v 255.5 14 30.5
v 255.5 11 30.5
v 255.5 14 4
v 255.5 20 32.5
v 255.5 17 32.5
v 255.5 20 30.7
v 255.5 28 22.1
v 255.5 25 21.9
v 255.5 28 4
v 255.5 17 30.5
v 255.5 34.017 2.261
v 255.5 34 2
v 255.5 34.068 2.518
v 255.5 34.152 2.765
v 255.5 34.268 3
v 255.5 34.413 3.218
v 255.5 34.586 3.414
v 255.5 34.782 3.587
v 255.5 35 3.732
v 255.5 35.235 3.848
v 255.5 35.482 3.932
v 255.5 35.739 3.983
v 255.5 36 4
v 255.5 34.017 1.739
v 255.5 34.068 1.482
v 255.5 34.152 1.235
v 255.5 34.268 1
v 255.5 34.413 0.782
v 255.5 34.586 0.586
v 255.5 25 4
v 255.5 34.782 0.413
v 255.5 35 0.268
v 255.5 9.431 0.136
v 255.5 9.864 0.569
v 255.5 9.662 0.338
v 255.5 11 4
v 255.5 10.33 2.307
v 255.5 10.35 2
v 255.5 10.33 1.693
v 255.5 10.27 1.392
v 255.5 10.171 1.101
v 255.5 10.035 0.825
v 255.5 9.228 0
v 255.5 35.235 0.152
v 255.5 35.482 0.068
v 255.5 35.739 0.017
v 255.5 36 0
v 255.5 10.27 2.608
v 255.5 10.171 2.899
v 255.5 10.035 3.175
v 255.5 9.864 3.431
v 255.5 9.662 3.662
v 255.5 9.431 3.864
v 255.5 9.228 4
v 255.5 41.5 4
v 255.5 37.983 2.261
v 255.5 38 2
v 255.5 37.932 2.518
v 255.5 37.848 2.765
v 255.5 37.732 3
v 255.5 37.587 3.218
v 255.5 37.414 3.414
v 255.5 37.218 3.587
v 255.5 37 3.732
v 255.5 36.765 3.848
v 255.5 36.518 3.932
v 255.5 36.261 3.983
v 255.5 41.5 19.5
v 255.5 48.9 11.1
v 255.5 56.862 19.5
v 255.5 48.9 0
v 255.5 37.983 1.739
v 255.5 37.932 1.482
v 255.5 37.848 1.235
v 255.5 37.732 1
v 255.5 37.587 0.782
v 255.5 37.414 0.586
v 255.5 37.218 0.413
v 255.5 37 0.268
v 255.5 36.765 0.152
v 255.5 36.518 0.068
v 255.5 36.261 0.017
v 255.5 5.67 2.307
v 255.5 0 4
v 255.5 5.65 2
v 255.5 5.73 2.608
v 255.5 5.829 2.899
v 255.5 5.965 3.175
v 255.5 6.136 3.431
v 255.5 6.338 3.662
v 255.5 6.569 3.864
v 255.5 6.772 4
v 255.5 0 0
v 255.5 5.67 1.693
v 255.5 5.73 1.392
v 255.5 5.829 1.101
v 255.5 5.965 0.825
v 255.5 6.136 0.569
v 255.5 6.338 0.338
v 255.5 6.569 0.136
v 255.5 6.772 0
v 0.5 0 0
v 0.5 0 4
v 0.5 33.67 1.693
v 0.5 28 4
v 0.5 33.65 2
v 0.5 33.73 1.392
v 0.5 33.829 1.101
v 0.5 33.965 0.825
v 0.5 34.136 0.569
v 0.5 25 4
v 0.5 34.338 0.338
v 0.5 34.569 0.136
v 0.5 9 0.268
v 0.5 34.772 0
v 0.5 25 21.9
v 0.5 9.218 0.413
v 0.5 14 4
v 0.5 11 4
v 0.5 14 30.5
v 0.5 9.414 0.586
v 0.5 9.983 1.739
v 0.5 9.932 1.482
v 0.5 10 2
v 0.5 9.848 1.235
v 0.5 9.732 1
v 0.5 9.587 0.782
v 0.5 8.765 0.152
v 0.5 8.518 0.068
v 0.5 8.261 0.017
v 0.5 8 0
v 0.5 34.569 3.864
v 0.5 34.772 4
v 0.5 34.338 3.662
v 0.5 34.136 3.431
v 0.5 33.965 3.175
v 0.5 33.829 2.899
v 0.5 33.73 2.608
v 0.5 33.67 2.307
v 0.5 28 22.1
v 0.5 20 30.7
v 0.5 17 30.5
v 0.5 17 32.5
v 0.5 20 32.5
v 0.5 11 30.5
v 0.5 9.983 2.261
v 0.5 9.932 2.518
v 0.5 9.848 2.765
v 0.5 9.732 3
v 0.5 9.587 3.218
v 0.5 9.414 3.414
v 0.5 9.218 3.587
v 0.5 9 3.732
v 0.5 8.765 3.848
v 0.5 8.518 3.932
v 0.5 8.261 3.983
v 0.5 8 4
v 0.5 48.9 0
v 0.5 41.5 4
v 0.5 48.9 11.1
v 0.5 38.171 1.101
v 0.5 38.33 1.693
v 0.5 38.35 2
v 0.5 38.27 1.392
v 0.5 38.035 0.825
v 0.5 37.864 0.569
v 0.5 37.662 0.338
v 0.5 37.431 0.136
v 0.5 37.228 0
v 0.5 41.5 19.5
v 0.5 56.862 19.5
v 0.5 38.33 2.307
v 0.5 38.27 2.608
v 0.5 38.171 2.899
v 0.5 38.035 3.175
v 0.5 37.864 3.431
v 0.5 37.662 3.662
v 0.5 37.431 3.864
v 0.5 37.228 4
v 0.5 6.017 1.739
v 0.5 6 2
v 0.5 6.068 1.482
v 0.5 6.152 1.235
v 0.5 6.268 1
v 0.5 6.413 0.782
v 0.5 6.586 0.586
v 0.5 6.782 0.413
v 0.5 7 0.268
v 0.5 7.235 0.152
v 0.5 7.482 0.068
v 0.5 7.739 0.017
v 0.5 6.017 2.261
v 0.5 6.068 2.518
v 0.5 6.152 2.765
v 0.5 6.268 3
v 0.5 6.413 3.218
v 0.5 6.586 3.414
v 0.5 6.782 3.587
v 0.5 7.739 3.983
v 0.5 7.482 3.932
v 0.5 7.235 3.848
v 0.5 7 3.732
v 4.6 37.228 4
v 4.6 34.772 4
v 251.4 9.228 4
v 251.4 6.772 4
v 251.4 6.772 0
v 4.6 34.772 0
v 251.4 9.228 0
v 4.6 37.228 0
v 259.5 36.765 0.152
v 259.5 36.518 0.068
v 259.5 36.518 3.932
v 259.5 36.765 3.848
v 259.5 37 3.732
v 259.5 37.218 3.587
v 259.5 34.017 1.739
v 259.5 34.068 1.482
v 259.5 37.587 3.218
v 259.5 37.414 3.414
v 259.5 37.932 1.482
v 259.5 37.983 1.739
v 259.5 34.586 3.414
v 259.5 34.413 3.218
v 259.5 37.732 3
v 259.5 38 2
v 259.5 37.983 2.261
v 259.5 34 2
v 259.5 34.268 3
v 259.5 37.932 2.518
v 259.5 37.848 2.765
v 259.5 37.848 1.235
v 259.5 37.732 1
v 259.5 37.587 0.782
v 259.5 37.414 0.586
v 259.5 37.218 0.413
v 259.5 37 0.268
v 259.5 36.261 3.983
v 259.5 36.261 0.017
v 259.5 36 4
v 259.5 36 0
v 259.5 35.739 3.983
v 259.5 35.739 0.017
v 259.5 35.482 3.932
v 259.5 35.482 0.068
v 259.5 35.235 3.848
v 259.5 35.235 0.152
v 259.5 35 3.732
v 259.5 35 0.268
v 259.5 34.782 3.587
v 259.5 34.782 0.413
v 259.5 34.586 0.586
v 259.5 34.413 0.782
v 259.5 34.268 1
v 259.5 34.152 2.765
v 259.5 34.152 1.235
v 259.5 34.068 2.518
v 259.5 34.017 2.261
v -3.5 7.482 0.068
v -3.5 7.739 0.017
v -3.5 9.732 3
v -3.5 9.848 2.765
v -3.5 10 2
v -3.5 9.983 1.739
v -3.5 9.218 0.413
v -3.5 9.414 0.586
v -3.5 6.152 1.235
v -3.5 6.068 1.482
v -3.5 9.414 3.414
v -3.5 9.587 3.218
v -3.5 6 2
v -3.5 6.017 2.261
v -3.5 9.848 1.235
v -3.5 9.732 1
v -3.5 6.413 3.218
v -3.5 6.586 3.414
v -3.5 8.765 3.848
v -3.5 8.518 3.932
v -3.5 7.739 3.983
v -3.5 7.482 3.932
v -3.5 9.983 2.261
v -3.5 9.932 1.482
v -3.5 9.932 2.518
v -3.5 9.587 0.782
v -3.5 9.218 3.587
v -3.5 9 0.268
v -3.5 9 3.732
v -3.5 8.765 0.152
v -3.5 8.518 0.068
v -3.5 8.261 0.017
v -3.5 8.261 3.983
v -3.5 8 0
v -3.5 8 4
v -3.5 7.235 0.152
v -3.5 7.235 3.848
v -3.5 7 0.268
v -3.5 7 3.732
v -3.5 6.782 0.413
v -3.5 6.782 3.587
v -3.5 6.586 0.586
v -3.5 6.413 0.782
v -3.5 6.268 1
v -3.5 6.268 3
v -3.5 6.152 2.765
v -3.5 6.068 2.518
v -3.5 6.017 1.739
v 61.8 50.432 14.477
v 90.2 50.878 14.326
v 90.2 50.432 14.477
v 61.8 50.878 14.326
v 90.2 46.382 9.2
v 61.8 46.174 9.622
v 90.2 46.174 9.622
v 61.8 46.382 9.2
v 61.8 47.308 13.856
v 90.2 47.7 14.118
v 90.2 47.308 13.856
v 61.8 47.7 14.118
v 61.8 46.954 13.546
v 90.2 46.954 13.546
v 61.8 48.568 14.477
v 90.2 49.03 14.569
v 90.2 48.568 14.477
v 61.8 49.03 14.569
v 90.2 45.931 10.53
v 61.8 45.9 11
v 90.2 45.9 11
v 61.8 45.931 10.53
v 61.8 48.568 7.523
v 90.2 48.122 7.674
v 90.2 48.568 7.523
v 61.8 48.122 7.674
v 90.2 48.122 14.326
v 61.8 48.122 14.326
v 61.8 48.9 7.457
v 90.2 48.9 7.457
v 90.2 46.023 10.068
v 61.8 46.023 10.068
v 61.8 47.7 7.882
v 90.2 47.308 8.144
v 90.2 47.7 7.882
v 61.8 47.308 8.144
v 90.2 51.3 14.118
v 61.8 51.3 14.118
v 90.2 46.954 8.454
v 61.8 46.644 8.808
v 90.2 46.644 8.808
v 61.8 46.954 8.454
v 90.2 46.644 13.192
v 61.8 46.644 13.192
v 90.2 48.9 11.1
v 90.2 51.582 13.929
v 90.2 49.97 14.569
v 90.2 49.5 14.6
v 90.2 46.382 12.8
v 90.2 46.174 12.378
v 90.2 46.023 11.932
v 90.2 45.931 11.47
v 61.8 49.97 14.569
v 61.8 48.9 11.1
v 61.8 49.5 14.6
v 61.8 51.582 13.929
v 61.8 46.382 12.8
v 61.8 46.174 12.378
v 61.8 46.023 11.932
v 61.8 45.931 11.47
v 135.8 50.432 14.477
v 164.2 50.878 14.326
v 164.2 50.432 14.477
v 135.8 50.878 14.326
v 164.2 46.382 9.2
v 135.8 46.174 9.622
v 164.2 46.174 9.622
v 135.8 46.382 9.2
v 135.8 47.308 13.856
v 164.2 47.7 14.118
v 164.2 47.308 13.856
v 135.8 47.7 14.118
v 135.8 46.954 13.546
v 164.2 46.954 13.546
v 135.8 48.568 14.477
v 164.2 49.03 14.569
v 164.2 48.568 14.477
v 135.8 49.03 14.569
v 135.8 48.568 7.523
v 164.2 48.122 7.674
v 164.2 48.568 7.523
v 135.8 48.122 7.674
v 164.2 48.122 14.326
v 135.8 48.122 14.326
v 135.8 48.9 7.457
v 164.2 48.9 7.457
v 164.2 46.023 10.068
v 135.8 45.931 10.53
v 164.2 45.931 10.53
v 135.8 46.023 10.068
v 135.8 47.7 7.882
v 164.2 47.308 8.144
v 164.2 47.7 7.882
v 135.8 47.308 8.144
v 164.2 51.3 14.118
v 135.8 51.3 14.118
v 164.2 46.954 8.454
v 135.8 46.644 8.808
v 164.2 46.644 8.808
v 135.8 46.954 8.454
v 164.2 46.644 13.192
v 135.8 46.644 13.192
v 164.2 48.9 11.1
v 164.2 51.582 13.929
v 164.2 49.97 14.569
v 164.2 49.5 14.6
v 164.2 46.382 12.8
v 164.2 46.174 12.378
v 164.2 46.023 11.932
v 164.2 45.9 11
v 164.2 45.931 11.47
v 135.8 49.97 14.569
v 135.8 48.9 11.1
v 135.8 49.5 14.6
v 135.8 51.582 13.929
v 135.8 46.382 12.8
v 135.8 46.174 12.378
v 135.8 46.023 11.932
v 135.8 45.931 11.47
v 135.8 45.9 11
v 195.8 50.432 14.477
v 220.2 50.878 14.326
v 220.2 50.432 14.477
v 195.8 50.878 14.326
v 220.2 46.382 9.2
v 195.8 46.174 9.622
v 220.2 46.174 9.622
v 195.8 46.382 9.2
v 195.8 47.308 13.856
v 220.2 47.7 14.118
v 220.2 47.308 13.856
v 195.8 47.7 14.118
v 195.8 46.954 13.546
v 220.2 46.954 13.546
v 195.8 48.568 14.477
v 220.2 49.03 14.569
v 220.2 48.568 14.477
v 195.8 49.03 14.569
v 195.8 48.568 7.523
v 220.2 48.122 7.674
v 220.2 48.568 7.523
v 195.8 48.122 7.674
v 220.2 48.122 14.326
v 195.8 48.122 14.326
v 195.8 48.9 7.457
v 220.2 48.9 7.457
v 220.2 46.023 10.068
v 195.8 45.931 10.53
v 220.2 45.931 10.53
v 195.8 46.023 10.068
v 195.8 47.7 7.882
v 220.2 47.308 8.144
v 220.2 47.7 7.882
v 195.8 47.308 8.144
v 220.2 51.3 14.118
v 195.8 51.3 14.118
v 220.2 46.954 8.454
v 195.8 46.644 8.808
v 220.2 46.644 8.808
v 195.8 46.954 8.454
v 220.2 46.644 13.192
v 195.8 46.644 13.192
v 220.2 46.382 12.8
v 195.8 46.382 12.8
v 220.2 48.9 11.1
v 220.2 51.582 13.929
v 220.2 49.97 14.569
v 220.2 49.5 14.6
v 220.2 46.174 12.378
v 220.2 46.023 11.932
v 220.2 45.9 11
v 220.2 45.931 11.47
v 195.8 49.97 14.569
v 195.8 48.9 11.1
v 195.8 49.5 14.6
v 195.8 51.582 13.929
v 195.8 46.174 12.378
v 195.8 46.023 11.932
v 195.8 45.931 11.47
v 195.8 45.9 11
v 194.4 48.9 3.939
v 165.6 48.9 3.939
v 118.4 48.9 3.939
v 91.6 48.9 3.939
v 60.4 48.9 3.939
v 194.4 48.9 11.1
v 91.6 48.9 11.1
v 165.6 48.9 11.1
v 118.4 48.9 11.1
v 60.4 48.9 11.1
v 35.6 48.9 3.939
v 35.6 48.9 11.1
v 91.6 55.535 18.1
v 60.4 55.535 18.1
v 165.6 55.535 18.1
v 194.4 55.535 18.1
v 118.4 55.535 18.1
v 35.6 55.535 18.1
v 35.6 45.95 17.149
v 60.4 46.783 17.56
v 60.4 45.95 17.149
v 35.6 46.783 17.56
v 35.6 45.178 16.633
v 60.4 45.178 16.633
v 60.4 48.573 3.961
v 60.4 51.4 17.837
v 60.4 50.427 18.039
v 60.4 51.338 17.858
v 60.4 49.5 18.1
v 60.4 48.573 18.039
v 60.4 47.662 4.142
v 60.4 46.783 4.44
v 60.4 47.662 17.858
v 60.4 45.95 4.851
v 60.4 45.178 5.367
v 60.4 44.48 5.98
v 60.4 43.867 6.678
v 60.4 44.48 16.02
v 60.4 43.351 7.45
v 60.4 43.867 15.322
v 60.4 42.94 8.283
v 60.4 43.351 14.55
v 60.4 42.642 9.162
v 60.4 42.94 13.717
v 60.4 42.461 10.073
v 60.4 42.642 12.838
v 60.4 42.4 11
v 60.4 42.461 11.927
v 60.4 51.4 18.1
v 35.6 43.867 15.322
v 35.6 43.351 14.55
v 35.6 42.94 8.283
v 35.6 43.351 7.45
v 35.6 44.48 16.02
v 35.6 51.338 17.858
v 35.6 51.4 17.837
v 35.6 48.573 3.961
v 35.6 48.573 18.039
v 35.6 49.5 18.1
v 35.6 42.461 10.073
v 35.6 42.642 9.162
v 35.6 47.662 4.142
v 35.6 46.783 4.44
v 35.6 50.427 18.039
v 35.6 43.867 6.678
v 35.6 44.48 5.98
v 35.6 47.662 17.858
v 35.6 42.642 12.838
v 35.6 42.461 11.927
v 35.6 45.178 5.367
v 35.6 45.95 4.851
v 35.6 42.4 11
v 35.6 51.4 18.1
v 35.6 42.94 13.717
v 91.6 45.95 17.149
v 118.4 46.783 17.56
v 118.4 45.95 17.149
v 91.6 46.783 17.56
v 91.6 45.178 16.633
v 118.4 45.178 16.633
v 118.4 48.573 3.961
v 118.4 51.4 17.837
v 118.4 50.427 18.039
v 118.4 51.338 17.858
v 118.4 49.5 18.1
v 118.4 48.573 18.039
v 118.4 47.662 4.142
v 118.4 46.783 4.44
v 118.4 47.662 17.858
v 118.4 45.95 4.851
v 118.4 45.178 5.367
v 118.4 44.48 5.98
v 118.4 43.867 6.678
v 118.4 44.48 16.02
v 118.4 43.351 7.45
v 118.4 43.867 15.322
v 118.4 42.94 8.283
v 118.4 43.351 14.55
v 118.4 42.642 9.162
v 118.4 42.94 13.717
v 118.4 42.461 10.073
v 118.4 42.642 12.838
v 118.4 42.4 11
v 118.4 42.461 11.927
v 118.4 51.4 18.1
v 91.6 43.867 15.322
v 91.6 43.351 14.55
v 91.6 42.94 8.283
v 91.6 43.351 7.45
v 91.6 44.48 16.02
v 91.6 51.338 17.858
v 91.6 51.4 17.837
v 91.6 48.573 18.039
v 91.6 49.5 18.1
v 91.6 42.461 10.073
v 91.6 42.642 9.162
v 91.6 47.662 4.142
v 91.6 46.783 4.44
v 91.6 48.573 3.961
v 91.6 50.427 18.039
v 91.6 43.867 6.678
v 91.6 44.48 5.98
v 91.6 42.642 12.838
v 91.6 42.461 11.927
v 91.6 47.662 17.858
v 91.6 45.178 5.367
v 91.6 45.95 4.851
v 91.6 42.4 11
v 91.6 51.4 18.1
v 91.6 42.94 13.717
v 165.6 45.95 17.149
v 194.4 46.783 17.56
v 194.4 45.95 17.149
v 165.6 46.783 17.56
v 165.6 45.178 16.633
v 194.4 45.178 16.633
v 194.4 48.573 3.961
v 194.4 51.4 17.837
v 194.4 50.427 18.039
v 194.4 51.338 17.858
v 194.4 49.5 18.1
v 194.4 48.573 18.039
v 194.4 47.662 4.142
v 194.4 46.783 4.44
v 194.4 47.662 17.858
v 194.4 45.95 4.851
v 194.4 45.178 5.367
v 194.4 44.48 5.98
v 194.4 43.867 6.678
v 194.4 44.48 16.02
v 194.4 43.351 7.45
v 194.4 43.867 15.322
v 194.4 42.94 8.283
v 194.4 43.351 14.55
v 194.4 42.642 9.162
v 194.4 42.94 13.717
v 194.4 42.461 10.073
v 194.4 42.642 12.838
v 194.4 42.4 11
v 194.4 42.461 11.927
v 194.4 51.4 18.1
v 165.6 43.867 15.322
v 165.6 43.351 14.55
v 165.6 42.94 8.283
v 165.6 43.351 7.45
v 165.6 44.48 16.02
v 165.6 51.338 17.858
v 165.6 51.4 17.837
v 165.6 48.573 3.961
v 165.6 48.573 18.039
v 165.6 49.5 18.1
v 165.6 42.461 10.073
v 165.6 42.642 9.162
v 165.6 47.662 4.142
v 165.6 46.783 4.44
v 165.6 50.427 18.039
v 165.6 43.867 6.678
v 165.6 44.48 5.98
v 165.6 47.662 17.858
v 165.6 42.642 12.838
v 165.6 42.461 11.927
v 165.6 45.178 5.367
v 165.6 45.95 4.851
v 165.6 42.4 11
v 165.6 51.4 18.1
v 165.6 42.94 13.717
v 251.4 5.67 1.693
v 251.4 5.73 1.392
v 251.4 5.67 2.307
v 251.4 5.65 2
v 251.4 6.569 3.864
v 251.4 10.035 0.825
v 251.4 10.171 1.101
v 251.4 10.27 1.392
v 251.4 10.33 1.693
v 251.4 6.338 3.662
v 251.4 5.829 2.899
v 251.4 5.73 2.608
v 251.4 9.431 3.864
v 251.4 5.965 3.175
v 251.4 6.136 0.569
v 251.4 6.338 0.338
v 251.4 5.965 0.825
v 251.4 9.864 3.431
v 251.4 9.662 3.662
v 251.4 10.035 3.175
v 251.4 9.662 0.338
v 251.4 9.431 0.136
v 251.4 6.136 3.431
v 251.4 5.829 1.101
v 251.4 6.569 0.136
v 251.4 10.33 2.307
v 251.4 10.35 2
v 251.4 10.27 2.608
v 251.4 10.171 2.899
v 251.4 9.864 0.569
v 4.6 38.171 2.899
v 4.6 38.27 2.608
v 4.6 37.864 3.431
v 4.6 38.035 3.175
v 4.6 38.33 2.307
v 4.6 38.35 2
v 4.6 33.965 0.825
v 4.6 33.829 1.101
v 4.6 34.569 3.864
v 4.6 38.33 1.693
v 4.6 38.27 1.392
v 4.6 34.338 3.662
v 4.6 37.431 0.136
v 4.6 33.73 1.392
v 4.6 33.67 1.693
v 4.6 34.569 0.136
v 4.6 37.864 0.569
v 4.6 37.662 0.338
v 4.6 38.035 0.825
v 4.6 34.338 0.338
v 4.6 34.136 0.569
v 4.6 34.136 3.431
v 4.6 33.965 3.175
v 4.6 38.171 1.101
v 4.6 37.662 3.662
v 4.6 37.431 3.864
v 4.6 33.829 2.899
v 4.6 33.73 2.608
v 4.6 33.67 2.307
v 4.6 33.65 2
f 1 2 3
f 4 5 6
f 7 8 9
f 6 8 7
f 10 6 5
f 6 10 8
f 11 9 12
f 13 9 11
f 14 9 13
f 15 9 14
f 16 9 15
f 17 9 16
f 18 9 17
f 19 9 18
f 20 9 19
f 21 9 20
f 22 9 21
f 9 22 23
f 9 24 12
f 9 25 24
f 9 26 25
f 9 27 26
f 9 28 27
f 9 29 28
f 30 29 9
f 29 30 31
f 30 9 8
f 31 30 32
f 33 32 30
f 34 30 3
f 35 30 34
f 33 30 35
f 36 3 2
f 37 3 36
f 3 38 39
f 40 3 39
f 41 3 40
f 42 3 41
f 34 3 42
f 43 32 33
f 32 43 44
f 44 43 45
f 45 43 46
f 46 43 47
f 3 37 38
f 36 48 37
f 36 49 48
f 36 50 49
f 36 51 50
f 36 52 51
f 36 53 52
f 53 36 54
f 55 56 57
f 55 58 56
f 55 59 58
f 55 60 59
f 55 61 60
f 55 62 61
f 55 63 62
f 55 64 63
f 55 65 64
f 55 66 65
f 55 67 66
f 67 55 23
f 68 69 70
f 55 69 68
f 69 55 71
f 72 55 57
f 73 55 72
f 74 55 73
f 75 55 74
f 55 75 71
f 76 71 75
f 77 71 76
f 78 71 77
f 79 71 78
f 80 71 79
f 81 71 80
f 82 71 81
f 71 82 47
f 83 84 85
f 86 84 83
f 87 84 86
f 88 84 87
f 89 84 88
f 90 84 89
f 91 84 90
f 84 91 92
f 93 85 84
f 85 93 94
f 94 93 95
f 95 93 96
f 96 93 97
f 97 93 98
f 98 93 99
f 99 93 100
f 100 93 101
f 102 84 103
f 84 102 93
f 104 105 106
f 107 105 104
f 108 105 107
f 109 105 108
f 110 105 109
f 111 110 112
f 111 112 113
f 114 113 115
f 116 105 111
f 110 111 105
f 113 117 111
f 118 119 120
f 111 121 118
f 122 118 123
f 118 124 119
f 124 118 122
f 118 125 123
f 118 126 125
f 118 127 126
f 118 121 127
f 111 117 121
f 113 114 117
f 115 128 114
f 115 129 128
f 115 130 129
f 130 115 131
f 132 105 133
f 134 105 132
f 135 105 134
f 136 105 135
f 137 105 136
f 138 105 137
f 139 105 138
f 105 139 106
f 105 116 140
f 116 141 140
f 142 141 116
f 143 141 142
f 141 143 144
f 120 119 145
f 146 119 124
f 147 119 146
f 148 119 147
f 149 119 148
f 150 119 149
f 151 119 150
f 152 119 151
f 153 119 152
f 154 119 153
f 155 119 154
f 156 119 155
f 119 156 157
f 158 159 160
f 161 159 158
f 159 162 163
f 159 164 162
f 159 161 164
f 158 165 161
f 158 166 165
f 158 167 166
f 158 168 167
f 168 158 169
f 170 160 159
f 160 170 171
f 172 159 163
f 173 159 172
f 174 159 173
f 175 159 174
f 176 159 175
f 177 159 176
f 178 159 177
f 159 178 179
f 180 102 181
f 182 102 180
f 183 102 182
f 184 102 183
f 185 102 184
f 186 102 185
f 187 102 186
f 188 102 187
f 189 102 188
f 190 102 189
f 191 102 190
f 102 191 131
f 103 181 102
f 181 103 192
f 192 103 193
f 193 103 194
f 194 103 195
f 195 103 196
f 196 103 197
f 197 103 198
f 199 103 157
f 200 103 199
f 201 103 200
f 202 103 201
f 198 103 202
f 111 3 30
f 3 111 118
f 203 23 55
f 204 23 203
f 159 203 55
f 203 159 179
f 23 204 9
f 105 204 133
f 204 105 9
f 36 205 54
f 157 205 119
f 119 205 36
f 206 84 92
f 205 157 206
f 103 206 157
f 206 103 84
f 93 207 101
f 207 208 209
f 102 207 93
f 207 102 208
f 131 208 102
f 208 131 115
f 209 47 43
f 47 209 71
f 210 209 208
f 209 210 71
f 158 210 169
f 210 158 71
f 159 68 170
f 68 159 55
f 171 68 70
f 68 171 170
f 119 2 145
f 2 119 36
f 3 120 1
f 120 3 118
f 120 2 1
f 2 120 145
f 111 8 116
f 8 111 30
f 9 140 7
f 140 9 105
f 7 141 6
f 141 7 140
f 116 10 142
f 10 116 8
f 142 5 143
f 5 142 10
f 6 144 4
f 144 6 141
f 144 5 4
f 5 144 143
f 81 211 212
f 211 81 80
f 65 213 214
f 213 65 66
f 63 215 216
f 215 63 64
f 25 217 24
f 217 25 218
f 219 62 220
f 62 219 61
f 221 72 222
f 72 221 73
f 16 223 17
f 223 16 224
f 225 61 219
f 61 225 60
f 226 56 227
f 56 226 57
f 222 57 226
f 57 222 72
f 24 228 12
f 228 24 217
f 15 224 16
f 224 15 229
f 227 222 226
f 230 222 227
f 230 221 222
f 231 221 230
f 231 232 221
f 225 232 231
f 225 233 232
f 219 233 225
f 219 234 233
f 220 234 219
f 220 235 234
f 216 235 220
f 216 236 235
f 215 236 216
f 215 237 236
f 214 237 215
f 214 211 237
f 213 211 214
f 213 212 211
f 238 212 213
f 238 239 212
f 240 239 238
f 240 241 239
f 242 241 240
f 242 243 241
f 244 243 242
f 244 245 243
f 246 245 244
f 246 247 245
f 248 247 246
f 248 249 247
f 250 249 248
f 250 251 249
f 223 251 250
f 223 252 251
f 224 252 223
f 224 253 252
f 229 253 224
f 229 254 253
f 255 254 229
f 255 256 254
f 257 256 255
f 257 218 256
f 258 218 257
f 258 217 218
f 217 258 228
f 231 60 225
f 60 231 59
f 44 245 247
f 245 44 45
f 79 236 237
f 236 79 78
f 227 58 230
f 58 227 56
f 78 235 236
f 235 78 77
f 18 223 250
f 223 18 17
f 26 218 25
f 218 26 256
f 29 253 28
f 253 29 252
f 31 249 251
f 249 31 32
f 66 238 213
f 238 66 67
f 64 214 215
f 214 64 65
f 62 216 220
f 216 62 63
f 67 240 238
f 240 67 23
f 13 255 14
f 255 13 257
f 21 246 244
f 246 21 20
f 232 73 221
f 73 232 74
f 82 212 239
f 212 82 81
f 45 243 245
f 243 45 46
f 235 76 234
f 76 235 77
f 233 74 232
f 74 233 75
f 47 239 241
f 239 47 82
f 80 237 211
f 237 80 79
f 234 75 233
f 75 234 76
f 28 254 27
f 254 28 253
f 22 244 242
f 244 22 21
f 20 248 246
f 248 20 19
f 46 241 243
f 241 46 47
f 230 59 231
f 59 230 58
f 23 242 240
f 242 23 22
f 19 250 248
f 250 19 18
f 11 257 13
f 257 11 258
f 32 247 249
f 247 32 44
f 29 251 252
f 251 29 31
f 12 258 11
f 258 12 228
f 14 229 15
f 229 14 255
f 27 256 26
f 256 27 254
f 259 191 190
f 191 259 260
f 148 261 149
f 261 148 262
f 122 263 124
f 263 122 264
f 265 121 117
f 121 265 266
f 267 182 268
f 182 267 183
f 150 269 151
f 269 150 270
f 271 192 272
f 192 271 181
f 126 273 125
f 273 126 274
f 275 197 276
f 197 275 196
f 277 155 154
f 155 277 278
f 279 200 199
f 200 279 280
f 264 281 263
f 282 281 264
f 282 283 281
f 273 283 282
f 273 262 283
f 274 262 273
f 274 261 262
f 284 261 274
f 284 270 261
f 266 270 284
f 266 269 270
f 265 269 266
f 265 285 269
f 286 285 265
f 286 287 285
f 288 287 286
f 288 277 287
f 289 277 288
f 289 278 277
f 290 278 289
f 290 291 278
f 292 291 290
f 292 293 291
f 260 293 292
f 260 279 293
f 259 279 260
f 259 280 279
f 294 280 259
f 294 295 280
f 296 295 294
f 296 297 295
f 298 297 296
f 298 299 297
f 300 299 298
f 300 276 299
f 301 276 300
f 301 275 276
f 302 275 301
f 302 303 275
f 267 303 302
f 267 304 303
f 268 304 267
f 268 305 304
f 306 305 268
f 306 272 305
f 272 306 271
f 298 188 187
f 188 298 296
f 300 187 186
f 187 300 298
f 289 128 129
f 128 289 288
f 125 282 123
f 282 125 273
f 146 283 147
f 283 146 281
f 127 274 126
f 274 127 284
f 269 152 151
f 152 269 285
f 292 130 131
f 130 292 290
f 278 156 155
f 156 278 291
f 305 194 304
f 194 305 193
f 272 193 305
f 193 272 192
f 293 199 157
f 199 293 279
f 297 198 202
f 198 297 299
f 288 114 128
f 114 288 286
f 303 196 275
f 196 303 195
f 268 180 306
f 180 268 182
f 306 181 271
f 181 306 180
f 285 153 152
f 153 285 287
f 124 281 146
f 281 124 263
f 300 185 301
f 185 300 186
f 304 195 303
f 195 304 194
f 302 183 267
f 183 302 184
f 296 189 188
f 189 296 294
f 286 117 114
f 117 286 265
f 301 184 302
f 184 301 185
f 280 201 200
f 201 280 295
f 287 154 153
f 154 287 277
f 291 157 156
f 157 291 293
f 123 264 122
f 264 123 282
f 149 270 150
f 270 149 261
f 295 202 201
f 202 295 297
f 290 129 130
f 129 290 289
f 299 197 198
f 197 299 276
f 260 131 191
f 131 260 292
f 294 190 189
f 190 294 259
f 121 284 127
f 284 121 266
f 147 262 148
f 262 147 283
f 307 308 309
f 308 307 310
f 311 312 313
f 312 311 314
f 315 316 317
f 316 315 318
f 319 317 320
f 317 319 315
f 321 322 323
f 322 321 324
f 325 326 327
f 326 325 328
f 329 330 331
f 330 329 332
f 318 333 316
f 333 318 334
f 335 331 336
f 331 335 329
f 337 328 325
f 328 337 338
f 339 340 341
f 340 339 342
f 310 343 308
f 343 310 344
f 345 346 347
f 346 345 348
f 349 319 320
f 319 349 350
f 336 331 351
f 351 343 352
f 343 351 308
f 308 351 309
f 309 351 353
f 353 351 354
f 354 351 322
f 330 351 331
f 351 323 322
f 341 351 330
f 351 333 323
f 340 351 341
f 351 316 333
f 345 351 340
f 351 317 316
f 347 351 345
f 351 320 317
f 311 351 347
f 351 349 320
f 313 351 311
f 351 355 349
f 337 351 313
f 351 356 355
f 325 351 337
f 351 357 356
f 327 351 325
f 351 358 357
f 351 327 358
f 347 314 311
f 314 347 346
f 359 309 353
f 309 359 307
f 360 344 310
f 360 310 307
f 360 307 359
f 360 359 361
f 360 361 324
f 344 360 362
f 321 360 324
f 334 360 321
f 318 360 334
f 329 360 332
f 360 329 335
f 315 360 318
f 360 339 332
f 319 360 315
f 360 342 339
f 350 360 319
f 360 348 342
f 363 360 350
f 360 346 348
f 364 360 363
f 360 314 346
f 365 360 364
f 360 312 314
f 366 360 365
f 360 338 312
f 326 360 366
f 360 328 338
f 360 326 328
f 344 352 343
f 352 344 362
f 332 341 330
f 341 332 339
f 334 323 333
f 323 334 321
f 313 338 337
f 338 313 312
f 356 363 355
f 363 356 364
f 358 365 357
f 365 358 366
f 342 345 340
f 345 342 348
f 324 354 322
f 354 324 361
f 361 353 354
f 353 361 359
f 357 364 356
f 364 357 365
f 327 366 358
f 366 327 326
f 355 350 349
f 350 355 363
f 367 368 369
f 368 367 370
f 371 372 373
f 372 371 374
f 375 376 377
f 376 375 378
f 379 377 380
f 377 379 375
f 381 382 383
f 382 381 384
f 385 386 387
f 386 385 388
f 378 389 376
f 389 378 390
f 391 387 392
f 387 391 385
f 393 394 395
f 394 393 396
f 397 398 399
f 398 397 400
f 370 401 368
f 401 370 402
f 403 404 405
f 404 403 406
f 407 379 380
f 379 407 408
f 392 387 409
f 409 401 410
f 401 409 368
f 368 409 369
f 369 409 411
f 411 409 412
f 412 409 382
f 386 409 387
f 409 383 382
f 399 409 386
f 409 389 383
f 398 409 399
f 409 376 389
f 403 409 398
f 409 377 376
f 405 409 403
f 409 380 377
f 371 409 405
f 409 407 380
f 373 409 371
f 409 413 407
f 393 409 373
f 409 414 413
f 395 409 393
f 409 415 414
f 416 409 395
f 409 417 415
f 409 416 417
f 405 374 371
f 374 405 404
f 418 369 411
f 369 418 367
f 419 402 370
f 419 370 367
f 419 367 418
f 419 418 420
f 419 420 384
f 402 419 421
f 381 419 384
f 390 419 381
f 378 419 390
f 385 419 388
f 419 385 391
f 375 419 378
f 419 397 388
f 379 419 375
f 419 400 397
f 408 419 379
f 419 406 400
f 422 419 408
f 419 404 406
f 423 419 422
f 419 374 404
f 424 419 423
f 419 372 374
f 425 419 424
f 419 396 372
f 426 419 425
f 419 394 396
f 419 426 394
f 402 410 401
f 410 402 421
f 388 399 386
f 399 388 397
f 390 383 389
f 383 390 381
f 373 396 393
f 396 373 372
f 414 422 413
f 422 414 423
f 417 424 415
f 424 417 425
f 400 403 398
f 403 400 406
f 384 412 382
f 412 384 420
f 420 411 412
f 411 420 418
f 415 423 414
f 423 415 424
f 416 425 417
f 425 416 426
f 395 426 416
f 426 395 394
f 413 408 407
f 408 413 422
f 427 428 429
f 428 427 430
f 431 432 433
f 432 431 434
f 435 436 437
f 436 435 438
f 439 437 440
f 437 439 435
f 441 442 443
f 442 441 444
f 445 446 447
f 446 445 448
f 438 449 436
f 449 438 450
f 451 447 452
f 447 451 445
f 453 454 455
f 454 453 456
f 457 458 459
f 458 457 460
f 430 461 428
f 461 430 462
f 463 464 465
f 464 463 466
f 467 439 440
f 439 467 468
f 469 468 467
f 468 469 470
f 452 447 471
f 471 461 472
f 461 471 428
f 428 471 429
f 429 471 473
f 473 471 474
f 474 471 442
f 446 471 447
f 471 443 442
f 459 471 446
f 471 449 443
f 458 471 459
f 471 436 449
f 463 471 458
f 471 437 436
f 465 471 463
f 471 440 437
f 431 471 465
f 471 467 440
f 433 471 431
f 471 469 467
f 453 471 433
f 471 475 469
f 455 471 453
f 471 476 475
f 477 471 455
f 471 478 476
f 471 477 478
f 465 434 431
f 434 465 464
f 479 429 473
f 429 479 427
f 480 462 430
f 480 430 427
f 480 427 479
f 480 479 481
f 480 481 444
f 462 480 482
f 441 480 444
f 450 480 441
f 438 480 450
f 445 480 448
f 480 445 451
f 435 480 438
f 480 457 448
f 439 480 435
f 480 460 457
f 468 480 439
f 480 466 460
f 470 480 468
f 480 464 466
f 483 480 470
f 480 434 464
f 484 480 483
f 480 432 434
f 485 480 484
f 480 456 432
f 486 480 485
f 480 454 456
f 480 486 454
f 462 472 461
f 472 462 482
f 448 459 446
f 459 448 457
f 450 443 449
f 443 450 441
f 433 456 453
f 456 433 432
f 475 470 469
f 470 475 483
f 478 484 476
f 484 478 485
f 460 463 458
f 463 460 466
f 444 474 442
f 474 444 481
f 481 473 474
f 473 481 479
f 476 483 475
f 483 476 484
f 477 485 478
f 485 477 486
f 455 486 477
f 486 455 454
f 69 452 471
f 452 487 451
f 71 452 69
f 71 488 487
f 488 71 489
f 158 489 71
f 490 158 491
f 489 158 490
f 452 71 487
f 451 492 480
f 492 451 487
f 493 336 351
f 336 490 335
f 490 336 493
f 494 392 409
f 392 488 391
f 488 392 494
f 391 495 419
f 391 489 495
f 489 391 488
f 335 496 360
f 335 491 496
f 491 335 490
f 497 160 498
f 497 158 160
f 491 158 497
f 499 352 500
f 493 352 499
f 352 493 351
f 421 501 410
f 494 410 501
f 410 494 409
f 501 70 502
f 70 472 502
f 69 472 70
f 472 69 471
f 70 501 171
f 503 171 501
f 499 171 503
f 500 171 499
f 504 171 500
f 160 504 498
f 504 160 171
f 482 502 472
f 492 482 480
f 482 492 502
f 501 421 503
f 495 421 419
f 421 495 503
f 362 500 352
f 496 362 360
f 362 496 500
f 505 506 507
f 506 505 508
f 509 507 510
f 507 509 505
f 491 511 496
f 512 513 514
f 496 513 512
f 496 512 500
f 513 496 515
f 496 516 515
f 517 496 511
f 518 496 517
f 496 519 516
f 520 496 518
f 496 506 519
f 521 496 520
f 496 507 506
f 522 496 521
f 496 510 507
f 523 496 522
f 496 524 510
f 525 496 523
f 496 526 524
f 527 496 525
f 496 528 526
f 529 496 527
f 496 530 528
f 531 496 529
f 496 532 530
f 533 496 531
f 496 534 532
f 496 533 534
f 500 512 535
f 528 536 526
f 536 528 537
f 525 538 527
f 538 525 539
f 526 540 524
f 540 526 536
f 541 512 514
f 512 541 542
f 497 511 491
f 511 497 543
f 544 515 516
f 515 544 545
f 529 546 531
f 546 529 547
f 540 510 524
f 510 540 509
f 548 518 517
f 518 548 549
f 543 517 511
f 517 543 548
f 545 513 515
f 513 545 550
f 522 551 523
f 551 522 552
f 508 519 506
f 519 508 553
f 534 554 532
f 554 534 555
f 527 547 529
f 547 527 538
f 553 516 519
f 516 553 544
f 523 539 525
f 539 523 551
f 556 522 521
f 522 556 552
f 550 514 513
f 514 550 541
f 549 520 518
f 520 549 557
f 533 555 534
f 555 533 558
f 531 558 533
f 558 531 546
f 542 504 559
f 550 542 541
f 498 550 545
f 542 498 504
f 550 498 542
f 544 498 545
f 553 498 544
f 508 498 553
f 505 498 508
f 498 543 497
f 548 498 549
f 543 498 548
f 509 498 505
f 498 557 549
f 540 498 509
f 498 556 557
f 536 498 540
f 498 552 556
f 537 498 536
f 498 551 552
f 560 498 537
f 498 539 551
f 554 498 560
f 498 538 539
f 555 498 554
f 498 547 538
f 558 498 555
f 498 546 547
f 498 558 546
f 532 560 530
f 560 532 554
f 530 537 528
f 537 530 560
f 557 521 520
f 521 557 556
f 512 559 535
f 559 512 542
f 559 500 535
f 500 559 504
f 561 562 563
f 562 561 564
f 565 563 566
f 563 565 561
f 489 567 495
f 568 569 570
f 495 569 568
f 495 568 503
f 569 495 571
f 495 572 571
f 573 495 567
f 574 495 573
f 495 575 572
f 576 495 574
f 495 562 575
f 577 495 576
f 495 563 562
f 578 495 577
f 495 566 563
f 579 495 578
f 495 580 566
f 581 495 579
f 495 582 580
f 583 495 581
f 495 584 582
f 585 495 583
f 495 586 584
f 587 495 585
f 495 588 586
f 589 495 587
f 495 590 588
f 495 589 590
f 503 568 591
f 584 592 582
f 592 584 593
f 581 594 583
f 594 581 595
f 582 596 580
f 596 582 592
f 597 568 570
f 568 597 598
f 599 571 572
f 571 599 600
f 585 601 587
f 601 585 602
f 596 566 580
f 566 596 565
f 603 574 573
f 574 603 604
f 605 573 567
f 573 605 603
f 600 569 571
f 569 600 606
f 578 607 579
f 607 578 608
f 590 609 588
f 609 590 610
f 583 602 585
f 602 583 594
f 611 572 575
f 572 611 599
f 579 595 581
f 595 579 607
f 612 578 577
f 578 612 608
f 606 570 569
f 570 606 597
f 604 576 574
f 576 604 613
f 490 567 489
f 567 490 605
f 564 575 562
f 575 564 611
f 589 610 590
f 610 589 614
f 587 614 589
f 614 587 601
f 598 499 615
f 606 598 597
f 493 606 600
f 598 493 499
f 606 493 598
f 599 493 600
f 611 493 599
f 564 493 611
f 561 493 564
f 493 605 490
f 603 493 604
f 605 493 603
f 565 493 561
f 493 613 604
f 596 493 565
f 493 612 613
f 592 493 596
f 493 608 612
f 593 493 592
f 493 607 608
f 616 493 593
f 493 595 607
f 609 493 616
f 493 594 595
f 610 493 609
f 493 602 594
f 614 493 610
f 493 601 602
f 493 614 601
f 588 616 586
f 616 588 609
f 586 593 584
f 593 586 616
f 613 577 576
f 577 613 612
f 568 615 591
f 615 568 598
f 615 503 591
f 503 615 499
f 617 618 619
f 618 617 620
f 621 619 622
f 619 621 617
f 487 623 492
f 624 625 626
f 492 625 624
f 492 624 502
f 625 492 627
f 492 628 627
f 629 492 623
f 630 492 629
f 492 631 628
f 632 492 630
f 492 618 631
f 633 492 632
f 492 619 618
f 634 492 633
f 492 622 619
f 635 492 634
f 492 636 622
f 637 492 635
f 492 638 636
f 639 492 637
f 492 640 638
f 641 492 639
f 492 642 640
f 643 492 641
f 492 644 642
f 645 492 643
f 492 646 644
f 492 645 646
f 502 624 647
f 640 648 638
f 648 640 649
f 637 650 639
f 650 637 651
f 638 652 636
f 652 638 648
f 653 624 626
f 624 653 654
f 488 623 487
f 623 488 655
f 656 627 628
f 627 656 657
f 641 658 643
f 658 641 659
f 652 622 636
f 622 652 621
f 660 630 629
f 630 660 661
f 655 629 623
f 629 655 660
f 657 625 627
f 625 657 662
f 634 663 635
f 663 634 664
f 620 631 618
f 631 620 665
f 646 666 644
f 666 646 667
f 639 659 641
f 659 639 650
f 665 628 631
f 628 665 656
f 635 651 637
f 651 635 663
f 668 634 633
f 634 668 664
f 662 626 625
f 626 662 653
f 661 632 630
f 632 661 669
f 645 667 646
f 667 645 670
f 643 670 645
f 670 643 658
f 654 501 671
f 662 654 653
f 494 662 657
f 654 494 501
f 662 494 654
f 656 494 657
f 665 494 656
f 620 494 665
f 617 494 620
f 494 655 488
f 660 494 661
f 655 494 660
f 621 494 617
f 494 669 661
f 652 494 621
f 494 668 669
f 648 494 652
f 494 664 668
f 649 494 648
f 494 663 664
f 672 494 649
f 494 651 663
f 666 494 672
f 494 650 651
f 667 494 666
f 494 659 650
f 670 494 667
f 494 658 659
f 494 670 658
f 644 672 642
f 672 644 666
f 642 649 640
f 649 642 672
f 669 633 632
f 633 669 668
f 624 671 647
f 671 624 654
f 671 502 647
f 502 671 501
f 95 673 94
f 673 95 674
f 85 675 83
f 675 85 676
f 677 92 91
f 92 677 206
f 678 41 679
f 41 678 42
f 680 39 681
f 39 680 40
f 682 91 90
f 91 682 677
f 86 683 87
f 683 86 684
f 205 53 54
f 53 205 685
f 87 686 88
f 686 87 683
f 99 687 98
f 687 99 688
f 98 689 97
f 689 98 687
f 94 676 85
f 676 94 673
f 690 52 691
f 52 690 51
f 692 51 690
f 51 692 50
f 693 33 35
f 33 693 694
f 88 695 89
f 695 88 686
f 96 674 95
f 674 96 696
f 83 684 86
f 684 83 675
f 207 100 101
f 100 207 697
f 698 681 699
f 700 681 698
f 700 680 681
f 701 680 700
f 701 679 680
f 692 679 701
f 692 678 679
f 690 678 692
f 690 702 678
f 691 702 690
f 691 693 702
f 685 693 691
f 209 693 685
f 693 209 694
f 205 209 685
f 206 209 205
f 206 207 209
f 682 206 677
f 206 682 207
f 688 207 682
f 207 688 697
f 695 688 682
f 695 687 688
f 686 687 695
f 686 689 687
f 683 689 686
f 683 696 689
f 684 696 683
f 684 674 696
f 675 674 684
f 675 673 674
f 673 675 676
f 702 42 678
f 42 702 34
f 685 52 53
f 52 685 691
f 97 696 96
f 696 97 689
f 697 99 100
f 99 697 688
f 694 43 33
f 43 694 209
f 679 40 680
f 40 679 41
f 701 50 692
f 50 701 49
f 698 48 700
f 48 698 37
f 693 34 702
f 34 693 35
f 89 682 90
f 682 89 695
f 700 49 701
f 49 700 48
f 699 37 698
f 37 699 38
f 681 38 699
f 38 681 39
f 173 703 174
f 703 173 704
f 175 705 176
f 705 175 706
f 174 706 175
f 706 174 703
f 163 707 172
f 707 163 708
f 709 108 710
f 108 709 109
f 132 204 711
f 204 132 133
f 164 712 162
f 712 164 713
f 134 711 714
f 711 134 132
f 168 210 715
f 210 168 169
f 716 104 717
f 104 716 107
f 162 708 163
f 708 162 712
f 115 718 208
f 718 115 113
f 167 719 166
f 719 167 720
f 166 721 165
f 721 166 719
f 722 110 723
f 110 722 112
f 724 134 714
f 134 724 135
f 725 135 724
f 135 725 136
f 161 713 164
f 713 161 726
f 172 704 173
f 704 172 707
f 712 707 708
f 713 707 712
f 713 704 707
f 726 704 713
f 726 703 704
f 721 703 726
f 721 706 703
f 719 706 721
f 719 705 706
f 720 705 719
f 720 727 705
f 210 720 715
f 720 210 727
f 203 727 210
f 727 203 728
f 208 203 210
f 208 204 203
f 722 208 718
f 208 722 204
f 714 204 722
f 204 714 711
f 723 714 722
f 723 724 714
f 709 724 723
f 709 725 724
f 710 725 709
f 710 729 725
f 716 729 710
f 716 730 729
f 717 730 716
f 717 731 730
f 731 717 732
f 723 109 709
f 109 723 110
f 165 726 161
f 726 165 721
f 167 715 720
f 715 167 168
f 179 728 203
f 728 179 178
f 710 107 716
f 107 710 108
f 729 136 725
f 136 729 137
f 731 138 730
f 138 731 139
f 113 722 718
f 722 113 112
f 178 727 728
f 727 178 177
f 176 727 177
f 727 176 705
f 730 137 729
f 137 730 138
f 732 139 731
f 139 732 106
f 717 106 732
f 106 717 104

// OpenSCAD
hinge_part = "equipment_base";
include <../direct_mount_enclosure.scad>;
